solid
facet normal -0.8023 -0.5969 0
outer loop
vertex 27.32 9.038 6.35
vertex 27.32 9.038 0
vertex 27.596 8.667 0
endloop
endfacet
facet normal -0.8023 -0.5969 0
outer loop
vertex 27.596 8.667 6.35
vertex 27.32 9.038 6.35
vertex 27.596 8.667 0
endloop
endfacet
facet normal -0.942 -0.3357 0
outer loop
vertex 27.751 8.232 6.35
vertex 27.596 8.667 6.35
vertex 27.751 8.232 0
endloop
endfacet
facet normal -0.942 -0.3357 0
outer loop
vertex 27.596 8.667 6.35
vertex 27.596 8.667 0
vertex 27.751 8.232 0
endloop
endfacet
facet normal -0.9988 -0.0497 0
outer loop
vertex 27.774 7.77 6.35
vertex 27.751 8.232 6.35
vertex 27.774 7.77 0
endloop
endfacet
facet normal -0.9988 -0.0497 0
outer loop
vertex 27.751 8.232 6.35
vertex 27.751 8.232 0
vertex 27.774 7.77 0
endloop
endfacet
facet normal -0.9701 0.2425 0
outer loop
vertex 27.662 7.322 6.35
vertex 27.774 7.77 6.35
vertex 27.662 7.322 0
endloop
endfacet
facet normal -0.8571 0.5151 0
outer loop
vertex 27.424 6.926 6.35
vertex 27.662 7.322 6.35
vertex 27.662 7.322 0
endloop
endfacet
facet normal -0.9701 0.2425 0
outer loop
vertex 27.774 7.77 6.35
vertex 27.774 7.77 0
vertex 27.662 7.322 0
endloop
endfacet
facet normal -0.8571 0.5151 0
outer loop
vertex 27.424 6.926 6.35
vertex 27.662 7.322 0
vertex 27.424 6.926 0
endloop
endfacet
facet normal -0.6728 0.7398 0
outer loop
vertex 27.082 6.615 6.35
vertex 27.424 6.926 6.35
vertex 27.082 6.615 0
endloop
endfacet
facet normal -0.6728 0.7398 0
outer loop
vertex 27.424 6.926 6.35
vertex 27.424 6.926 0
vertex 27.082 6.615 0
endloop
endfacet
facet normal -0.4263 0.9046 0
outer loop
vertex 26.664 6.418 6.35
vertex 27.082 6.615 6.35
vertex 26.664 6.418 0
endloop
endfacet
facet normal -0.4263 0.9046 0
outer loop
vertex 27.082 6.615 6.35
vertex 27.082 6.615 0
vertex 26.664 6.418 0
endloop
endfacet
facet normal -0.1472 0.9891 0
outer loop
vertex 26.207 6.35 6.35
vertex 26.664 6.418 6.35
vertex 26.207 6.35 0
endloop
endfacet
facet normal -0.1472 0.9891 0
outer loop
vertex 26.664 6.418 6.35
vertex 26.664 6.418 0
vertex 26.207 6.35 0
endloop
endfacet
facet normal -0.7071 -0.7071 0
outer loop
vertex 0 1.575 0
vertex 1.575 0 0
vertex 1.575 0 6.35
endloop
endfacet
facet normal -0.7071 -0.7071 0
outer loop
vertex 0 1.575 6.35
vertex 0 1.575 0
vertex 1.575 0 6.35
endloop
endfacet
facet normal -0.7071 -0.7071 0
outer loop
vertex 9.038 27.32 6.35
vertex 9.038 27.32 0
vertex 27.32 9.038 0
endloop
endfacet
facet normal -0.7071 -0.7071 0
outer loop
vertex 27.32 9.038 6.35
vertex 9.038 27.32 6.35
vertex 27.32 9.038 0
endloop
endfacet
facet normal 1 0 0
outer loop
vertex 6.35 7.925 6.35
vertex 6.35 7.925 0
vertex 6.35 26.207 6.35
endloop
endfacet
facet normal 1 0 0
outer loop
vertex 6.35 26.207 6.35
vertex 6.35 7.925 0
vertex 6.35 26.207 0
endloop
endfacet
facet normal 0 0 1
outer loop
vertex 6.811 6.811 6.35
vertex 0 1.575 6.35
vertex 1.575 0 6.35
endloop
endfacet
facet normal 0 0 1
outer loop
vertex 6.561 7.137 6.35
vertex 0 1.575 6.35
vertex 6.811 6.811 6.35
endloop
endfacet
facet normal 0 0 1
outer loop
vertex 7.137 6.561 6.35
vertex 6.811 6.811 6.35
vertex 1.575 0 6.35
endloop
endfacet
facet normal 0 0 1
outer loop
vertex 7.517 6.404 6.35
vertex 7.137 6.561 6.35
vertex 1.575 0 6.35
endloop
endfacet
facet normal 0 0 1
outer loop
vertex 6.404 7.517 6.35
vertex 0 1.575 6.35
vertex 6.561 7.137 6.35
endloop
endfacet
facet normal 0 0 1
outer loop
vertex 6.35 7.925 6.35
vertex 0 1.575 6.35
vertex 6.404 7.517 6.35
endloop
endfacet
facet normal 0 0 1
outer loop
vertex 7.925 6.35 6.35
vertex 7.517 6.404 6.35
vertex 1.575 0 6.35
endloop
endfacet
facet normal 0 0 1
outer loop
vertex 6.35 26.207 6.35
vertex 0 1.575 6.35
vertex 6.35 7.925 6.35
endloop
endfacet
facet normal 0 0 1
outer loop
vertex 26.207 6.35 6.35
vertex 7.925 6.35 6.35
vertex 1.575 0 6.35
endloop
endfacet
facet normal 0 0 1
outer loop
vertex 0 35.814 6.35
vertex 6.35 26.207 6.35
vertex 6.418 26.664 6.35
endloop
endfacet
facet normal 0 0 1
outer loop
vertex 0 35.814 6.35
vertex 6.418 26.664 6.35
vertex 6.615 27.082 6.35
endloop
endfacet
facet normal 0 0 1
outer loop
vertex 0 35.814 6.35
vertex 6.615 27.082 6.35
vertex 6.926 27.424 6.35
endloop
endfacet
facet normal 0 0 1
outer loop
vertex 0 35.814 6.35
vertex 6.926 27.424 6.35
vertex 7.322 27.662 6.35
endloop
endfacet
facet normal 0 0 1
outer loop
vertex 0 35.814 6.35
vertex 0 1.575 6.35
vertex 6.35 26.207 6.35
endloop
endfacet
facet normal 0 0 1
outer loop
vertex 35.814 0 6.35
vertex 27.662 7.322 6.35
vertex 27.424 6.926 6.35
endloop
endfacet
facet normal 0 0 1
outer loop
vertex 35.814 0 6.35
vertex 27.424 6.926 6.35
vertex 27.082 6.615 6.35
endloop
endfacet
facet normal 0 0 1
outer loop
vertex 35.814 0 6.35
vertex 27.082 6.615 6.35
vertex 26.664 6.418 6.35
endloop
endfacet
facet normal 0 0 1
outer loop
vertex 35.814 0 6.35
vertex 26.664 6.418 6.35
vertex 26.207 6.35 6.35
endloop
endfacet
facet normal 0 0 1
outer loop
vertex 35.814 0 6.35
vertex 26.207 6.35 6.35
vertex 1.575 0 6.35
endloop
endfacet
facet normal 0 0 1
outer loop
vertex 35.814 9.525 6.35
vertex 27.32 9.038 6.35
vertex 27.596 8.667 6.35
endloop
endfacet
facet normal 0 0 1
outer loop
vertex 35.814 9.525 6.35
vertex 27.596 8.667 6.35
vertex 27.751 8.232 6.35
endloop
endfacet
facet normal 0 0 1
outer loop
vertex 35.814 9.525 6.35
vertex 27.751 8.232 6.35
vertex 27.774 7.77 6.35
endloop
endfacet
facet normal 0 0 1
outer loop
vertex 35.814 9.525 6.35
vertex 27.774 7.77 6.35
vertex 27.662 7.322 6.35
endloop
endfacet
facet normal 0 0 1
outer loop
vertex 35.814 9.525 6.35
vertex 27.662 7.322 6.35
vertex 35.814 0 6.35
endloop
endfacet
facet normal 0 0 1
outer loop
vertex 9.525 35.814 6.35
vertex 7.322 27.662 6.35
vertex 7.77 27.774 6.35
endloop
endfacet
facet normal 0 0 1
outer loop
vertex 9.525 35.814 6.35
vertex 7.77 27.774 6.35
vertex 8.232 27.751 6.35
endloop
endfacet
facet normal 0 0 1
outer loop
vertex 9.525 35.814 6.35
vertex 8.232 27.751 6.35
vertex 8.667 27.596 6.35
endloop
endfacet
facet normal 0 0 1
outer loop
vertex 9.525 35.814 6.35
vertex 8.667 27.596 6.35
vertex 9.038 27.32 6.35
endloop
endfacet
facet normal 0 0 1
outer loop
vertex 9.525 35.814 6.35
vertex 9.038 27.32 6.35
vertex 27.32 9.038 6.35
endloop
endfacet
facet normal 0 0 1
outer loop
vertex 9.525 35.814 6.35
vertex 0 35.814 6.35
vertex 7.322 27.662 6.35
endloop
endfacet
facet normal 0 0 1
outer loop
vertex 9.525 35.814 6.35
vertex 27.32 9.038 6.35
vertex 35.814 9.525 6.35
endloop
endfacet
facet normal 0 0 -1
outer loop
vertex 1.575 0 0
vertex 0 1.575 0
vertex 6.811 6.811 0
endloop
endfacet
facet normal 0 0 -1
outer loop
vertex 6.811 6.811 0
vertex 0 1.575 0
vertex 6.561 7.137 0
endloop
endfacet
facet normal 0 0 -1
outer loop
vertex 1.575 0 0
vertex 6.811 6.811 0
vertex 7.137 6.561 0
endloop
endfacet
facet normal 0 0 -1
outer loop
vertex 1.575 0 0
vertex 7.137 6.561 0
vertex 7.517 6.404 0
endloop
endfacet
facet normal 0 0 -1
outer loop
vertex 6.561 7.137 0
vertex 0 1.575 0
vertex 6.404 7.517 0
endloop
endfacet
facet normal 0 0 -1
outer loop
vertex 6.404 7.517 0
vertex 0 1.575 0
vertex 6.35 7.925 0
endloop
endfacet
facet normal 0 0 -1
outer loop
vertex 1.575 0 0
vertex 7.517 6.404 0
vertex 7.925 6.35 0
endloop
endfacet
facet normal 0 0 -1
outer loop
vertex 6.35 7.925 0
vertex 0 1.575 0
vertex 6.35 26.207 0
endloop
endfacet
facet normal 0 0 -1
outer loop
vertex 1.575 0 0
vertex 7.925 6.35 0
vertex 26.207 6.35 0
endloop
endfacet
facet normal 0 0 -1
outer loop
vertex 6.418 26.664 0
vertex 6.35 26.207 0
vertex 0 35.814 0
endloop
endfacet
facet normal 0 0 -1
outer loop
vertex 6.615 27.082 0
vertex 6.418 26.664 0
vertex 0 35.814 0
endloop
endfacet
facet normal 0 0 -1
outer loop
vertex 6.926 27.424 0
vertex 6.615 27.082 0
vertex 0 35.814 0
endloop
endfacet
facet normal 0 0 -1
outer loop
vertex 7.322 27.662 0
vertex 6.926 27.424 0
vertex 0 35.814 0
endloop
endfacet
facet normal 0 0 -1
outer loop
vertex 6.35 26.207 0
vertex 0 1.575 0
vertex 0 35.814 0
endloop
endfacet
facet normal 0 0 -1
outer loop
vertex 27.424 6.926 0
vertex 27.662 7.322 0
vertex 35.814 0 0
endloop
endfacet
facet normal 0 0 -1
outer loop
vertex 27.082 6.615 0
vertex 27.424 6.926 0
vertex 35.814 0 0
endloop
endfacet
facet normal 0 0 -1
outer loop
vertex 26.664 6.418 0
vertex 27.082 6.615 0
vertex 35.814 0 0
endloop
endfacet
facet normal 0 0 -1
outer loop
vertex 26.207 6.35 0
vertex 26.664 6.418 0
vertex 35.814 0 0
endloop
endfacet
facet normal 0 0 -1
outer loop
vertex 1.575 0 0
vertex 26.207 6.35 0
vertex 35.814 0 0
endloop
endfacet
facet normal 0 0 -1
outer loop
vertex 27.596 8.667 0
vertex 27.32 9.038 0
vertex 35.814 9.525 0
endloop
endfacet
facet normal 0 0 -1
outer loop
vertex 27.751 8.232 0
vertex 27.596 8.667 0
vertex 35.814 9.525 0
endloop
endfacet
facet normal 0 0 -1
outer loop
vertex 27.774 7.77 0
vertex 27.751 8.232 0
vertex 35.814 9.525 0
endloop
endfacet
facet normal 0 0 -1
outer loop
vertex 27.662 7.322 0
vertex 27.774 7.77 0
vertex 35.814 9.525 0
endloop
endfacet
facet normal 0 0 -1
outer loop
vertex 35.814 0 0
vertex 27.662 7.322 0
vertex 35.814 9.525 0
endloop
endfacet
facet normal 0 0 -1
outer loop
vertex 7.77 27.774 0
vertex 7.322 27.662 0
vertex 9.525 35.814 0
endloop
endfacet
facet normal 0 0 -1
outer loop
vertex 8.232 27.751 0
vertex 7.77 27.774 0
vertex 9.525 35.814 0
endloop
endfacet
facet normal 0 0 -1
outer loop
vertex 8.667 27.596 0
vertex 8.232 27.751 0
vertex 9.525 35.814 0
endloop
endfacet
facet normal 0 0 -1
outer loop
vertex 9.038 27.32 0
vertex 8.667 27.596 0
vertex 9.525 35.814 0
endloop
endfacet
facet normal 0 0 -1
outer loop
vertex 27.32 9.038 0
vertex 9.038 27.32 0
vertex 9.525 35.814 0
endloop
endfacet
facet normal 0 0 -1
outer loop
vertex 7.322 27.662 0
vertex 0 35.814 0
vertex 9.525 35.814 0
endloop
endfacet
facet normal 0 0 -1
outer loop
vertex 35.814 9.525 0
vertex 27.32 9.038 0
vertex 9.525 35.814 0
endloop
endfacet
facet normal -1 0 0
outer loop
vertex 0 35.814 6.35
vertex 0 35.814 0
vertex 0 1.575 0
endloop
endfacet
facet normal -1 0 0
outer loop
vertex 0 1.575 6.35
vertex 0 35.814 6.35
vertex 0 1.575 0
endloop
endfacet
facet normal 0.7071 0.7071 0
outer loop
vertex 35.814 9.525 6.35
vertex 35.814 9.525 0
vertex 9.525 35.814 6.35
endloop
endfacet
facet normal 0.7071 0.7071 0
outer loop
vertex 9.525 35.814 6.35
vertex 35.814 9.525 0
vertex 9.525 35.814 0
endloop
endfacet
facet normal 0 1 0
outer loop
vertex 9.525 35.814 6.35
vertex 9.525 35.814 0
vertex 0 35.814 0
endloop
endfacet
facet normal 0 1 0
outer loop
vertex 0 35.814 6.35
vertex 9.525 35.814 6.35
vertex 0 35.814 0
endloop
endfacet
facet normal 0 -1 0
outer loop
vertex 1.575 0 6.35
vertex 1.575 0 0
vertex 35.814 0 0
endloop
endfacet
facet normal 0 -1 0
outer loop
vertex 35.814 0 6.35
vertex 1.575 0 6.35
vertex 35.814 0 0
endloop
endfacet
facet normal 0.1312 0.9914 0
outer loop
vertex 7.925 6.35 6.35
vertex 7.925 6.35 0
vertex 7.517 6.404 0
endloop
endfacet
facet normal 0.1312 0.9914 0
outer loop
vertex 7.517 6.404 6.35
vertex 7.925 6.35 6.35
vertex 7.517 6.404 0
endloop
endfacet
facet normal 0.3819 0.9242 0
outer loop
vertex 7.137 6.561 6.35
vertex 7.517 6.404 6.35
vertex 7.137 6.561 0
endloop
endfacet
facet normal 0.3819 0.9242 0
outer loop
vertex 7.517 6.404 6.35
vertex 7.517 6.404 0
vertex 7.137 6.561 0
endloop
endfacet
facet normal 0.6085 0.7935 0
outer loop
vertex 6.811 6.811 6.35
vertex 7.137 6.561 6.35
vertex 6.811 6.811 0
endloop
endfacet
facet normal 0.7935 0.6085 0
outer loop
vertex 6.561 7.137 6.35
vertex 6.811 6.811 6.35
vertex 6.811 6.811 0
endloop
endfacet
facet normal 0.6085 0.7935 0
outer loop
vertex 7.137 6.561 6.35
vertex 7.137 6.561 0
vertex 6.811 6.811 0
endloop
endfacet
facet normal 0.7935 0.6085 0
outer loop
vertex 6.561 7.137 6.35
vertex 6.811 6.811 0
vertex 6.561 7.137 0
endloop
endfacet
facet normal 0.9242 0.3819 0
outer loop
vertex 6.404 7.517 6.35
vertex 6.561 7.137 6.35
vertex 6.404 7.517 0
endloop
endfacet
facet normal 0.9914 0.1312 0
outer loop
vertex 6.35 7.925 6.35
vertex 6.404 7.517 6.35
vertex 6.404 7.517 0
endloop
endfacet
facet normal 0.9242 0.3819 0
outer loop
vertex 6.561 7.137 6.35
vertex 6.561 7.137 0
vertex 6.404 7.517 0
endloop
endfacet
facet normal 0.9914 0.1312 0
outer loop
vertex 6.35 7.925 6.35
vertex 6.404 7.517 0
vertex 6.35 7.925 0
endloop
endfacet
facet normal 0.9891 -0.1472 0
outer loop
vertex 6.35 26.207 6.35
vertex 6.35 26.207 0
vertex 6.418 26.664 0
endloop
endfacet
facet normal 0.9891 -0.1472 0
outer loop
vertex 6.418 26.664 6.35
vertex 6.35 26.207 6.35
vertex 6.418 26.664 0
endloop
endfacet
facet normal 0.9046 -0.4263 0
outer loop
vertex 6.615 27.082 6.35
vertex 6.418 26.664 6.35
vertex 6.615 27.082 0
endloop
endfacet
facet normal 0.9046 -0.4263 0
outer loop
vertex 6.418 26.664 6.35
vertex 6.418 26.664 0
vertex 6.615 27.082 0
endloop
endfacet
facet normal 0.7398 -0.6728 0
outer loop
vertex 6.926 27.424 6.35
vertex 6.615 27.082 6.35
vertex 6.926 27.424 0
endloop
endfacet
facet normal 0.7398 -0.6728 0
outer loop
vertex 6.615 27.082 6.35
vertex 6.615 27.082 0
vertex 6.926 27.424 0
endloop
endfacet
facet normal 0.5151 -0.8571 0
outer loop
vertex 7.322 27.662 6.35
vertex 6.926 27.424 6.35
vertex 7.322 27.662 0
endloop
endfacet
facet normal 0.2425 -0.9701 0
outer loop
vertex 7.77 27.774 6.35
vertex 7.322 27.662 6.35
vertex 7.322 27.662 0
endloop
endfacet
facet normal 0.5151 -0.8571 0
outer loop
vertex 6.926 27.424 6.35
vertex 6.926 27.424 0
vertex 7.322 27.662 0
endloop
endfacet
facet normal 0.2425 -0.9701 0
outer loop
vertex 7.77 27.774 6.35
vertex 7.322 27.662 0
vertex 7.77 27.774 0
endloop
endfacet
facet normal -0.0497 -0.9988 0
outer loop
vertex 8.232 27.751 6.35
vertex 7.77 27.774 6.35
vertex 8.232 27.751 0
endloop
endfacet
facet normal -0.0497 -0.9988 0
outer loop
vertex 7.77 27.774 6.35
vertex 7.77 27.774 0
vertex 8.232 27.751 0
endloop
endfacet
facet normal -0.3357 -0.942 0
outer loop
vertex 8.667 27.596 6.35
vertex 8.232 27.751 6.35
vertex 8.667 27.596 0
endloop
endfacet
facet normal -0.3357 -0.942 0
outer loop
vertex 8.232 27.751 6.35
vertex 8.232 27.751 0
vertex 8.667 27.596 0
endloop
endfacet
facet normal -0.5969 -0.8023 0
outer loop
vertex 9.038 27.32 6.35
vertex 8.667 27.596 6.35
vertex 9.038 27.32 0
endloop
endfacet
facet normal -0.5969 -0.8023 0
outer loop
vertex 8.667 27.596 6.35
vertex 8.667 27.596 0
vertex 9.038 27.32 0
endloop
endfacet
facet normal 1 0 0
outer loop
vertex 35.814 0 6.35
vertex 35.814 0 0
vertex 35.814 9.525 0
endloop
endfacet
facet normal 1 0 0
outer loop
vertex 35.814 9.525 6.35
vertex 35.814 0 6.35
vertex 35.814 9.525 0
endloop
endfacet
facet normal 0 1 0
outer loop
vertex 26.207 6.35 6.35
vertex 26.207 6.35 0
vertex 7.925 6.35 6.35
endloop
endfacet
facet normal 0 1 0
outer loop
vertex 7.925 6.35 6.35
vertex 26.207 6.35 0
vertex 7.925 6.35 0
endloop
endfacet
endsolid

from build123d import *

# Parameters (mm, degrees)
F1_DEPTH = 6.35
F2_SIZE  = 1.5748


with BuildPart() as f1:
    # F0 (on Top) → F1 (new body)
    with BuildSketch(Plane.XY):
        Polygon((9.525, 35.814), (0, 35.814), (0, 0), (35.814, 0), (35.814, 9.525), align=None)
        with BuildLine():
            Line((6.35, 7.9248), (6.35, 26.20684))
            ThreePointArc((6.35, 26.20684), (7.32215, 27.661766), (9.038352, 27.320392))
            Line((9.038352, 27.320392), (27.320392, 9.038352))
            ThreePointArc((27.320392, 9.038352), (27.661766, 7.32215), (26.20684, 6.35))
            Line((26.20684, 6.35), (7.9248, 6.35))
            ThreePointArc((7.9248, 6.35), (6.811248, 6.811248), (6.35, 7.9248))
        make_face(mode=Mode.SUBTRACT)
    extrude(amount=F1_DEPTH)

    # F2
    f2_edges = [f1.edges().sort_by_distance(p)[0] for p in [
        (0, 0, 3.175),
    ]]
    chamfer(f2_edges, length=F2_SIZE)


solid = f1.part
